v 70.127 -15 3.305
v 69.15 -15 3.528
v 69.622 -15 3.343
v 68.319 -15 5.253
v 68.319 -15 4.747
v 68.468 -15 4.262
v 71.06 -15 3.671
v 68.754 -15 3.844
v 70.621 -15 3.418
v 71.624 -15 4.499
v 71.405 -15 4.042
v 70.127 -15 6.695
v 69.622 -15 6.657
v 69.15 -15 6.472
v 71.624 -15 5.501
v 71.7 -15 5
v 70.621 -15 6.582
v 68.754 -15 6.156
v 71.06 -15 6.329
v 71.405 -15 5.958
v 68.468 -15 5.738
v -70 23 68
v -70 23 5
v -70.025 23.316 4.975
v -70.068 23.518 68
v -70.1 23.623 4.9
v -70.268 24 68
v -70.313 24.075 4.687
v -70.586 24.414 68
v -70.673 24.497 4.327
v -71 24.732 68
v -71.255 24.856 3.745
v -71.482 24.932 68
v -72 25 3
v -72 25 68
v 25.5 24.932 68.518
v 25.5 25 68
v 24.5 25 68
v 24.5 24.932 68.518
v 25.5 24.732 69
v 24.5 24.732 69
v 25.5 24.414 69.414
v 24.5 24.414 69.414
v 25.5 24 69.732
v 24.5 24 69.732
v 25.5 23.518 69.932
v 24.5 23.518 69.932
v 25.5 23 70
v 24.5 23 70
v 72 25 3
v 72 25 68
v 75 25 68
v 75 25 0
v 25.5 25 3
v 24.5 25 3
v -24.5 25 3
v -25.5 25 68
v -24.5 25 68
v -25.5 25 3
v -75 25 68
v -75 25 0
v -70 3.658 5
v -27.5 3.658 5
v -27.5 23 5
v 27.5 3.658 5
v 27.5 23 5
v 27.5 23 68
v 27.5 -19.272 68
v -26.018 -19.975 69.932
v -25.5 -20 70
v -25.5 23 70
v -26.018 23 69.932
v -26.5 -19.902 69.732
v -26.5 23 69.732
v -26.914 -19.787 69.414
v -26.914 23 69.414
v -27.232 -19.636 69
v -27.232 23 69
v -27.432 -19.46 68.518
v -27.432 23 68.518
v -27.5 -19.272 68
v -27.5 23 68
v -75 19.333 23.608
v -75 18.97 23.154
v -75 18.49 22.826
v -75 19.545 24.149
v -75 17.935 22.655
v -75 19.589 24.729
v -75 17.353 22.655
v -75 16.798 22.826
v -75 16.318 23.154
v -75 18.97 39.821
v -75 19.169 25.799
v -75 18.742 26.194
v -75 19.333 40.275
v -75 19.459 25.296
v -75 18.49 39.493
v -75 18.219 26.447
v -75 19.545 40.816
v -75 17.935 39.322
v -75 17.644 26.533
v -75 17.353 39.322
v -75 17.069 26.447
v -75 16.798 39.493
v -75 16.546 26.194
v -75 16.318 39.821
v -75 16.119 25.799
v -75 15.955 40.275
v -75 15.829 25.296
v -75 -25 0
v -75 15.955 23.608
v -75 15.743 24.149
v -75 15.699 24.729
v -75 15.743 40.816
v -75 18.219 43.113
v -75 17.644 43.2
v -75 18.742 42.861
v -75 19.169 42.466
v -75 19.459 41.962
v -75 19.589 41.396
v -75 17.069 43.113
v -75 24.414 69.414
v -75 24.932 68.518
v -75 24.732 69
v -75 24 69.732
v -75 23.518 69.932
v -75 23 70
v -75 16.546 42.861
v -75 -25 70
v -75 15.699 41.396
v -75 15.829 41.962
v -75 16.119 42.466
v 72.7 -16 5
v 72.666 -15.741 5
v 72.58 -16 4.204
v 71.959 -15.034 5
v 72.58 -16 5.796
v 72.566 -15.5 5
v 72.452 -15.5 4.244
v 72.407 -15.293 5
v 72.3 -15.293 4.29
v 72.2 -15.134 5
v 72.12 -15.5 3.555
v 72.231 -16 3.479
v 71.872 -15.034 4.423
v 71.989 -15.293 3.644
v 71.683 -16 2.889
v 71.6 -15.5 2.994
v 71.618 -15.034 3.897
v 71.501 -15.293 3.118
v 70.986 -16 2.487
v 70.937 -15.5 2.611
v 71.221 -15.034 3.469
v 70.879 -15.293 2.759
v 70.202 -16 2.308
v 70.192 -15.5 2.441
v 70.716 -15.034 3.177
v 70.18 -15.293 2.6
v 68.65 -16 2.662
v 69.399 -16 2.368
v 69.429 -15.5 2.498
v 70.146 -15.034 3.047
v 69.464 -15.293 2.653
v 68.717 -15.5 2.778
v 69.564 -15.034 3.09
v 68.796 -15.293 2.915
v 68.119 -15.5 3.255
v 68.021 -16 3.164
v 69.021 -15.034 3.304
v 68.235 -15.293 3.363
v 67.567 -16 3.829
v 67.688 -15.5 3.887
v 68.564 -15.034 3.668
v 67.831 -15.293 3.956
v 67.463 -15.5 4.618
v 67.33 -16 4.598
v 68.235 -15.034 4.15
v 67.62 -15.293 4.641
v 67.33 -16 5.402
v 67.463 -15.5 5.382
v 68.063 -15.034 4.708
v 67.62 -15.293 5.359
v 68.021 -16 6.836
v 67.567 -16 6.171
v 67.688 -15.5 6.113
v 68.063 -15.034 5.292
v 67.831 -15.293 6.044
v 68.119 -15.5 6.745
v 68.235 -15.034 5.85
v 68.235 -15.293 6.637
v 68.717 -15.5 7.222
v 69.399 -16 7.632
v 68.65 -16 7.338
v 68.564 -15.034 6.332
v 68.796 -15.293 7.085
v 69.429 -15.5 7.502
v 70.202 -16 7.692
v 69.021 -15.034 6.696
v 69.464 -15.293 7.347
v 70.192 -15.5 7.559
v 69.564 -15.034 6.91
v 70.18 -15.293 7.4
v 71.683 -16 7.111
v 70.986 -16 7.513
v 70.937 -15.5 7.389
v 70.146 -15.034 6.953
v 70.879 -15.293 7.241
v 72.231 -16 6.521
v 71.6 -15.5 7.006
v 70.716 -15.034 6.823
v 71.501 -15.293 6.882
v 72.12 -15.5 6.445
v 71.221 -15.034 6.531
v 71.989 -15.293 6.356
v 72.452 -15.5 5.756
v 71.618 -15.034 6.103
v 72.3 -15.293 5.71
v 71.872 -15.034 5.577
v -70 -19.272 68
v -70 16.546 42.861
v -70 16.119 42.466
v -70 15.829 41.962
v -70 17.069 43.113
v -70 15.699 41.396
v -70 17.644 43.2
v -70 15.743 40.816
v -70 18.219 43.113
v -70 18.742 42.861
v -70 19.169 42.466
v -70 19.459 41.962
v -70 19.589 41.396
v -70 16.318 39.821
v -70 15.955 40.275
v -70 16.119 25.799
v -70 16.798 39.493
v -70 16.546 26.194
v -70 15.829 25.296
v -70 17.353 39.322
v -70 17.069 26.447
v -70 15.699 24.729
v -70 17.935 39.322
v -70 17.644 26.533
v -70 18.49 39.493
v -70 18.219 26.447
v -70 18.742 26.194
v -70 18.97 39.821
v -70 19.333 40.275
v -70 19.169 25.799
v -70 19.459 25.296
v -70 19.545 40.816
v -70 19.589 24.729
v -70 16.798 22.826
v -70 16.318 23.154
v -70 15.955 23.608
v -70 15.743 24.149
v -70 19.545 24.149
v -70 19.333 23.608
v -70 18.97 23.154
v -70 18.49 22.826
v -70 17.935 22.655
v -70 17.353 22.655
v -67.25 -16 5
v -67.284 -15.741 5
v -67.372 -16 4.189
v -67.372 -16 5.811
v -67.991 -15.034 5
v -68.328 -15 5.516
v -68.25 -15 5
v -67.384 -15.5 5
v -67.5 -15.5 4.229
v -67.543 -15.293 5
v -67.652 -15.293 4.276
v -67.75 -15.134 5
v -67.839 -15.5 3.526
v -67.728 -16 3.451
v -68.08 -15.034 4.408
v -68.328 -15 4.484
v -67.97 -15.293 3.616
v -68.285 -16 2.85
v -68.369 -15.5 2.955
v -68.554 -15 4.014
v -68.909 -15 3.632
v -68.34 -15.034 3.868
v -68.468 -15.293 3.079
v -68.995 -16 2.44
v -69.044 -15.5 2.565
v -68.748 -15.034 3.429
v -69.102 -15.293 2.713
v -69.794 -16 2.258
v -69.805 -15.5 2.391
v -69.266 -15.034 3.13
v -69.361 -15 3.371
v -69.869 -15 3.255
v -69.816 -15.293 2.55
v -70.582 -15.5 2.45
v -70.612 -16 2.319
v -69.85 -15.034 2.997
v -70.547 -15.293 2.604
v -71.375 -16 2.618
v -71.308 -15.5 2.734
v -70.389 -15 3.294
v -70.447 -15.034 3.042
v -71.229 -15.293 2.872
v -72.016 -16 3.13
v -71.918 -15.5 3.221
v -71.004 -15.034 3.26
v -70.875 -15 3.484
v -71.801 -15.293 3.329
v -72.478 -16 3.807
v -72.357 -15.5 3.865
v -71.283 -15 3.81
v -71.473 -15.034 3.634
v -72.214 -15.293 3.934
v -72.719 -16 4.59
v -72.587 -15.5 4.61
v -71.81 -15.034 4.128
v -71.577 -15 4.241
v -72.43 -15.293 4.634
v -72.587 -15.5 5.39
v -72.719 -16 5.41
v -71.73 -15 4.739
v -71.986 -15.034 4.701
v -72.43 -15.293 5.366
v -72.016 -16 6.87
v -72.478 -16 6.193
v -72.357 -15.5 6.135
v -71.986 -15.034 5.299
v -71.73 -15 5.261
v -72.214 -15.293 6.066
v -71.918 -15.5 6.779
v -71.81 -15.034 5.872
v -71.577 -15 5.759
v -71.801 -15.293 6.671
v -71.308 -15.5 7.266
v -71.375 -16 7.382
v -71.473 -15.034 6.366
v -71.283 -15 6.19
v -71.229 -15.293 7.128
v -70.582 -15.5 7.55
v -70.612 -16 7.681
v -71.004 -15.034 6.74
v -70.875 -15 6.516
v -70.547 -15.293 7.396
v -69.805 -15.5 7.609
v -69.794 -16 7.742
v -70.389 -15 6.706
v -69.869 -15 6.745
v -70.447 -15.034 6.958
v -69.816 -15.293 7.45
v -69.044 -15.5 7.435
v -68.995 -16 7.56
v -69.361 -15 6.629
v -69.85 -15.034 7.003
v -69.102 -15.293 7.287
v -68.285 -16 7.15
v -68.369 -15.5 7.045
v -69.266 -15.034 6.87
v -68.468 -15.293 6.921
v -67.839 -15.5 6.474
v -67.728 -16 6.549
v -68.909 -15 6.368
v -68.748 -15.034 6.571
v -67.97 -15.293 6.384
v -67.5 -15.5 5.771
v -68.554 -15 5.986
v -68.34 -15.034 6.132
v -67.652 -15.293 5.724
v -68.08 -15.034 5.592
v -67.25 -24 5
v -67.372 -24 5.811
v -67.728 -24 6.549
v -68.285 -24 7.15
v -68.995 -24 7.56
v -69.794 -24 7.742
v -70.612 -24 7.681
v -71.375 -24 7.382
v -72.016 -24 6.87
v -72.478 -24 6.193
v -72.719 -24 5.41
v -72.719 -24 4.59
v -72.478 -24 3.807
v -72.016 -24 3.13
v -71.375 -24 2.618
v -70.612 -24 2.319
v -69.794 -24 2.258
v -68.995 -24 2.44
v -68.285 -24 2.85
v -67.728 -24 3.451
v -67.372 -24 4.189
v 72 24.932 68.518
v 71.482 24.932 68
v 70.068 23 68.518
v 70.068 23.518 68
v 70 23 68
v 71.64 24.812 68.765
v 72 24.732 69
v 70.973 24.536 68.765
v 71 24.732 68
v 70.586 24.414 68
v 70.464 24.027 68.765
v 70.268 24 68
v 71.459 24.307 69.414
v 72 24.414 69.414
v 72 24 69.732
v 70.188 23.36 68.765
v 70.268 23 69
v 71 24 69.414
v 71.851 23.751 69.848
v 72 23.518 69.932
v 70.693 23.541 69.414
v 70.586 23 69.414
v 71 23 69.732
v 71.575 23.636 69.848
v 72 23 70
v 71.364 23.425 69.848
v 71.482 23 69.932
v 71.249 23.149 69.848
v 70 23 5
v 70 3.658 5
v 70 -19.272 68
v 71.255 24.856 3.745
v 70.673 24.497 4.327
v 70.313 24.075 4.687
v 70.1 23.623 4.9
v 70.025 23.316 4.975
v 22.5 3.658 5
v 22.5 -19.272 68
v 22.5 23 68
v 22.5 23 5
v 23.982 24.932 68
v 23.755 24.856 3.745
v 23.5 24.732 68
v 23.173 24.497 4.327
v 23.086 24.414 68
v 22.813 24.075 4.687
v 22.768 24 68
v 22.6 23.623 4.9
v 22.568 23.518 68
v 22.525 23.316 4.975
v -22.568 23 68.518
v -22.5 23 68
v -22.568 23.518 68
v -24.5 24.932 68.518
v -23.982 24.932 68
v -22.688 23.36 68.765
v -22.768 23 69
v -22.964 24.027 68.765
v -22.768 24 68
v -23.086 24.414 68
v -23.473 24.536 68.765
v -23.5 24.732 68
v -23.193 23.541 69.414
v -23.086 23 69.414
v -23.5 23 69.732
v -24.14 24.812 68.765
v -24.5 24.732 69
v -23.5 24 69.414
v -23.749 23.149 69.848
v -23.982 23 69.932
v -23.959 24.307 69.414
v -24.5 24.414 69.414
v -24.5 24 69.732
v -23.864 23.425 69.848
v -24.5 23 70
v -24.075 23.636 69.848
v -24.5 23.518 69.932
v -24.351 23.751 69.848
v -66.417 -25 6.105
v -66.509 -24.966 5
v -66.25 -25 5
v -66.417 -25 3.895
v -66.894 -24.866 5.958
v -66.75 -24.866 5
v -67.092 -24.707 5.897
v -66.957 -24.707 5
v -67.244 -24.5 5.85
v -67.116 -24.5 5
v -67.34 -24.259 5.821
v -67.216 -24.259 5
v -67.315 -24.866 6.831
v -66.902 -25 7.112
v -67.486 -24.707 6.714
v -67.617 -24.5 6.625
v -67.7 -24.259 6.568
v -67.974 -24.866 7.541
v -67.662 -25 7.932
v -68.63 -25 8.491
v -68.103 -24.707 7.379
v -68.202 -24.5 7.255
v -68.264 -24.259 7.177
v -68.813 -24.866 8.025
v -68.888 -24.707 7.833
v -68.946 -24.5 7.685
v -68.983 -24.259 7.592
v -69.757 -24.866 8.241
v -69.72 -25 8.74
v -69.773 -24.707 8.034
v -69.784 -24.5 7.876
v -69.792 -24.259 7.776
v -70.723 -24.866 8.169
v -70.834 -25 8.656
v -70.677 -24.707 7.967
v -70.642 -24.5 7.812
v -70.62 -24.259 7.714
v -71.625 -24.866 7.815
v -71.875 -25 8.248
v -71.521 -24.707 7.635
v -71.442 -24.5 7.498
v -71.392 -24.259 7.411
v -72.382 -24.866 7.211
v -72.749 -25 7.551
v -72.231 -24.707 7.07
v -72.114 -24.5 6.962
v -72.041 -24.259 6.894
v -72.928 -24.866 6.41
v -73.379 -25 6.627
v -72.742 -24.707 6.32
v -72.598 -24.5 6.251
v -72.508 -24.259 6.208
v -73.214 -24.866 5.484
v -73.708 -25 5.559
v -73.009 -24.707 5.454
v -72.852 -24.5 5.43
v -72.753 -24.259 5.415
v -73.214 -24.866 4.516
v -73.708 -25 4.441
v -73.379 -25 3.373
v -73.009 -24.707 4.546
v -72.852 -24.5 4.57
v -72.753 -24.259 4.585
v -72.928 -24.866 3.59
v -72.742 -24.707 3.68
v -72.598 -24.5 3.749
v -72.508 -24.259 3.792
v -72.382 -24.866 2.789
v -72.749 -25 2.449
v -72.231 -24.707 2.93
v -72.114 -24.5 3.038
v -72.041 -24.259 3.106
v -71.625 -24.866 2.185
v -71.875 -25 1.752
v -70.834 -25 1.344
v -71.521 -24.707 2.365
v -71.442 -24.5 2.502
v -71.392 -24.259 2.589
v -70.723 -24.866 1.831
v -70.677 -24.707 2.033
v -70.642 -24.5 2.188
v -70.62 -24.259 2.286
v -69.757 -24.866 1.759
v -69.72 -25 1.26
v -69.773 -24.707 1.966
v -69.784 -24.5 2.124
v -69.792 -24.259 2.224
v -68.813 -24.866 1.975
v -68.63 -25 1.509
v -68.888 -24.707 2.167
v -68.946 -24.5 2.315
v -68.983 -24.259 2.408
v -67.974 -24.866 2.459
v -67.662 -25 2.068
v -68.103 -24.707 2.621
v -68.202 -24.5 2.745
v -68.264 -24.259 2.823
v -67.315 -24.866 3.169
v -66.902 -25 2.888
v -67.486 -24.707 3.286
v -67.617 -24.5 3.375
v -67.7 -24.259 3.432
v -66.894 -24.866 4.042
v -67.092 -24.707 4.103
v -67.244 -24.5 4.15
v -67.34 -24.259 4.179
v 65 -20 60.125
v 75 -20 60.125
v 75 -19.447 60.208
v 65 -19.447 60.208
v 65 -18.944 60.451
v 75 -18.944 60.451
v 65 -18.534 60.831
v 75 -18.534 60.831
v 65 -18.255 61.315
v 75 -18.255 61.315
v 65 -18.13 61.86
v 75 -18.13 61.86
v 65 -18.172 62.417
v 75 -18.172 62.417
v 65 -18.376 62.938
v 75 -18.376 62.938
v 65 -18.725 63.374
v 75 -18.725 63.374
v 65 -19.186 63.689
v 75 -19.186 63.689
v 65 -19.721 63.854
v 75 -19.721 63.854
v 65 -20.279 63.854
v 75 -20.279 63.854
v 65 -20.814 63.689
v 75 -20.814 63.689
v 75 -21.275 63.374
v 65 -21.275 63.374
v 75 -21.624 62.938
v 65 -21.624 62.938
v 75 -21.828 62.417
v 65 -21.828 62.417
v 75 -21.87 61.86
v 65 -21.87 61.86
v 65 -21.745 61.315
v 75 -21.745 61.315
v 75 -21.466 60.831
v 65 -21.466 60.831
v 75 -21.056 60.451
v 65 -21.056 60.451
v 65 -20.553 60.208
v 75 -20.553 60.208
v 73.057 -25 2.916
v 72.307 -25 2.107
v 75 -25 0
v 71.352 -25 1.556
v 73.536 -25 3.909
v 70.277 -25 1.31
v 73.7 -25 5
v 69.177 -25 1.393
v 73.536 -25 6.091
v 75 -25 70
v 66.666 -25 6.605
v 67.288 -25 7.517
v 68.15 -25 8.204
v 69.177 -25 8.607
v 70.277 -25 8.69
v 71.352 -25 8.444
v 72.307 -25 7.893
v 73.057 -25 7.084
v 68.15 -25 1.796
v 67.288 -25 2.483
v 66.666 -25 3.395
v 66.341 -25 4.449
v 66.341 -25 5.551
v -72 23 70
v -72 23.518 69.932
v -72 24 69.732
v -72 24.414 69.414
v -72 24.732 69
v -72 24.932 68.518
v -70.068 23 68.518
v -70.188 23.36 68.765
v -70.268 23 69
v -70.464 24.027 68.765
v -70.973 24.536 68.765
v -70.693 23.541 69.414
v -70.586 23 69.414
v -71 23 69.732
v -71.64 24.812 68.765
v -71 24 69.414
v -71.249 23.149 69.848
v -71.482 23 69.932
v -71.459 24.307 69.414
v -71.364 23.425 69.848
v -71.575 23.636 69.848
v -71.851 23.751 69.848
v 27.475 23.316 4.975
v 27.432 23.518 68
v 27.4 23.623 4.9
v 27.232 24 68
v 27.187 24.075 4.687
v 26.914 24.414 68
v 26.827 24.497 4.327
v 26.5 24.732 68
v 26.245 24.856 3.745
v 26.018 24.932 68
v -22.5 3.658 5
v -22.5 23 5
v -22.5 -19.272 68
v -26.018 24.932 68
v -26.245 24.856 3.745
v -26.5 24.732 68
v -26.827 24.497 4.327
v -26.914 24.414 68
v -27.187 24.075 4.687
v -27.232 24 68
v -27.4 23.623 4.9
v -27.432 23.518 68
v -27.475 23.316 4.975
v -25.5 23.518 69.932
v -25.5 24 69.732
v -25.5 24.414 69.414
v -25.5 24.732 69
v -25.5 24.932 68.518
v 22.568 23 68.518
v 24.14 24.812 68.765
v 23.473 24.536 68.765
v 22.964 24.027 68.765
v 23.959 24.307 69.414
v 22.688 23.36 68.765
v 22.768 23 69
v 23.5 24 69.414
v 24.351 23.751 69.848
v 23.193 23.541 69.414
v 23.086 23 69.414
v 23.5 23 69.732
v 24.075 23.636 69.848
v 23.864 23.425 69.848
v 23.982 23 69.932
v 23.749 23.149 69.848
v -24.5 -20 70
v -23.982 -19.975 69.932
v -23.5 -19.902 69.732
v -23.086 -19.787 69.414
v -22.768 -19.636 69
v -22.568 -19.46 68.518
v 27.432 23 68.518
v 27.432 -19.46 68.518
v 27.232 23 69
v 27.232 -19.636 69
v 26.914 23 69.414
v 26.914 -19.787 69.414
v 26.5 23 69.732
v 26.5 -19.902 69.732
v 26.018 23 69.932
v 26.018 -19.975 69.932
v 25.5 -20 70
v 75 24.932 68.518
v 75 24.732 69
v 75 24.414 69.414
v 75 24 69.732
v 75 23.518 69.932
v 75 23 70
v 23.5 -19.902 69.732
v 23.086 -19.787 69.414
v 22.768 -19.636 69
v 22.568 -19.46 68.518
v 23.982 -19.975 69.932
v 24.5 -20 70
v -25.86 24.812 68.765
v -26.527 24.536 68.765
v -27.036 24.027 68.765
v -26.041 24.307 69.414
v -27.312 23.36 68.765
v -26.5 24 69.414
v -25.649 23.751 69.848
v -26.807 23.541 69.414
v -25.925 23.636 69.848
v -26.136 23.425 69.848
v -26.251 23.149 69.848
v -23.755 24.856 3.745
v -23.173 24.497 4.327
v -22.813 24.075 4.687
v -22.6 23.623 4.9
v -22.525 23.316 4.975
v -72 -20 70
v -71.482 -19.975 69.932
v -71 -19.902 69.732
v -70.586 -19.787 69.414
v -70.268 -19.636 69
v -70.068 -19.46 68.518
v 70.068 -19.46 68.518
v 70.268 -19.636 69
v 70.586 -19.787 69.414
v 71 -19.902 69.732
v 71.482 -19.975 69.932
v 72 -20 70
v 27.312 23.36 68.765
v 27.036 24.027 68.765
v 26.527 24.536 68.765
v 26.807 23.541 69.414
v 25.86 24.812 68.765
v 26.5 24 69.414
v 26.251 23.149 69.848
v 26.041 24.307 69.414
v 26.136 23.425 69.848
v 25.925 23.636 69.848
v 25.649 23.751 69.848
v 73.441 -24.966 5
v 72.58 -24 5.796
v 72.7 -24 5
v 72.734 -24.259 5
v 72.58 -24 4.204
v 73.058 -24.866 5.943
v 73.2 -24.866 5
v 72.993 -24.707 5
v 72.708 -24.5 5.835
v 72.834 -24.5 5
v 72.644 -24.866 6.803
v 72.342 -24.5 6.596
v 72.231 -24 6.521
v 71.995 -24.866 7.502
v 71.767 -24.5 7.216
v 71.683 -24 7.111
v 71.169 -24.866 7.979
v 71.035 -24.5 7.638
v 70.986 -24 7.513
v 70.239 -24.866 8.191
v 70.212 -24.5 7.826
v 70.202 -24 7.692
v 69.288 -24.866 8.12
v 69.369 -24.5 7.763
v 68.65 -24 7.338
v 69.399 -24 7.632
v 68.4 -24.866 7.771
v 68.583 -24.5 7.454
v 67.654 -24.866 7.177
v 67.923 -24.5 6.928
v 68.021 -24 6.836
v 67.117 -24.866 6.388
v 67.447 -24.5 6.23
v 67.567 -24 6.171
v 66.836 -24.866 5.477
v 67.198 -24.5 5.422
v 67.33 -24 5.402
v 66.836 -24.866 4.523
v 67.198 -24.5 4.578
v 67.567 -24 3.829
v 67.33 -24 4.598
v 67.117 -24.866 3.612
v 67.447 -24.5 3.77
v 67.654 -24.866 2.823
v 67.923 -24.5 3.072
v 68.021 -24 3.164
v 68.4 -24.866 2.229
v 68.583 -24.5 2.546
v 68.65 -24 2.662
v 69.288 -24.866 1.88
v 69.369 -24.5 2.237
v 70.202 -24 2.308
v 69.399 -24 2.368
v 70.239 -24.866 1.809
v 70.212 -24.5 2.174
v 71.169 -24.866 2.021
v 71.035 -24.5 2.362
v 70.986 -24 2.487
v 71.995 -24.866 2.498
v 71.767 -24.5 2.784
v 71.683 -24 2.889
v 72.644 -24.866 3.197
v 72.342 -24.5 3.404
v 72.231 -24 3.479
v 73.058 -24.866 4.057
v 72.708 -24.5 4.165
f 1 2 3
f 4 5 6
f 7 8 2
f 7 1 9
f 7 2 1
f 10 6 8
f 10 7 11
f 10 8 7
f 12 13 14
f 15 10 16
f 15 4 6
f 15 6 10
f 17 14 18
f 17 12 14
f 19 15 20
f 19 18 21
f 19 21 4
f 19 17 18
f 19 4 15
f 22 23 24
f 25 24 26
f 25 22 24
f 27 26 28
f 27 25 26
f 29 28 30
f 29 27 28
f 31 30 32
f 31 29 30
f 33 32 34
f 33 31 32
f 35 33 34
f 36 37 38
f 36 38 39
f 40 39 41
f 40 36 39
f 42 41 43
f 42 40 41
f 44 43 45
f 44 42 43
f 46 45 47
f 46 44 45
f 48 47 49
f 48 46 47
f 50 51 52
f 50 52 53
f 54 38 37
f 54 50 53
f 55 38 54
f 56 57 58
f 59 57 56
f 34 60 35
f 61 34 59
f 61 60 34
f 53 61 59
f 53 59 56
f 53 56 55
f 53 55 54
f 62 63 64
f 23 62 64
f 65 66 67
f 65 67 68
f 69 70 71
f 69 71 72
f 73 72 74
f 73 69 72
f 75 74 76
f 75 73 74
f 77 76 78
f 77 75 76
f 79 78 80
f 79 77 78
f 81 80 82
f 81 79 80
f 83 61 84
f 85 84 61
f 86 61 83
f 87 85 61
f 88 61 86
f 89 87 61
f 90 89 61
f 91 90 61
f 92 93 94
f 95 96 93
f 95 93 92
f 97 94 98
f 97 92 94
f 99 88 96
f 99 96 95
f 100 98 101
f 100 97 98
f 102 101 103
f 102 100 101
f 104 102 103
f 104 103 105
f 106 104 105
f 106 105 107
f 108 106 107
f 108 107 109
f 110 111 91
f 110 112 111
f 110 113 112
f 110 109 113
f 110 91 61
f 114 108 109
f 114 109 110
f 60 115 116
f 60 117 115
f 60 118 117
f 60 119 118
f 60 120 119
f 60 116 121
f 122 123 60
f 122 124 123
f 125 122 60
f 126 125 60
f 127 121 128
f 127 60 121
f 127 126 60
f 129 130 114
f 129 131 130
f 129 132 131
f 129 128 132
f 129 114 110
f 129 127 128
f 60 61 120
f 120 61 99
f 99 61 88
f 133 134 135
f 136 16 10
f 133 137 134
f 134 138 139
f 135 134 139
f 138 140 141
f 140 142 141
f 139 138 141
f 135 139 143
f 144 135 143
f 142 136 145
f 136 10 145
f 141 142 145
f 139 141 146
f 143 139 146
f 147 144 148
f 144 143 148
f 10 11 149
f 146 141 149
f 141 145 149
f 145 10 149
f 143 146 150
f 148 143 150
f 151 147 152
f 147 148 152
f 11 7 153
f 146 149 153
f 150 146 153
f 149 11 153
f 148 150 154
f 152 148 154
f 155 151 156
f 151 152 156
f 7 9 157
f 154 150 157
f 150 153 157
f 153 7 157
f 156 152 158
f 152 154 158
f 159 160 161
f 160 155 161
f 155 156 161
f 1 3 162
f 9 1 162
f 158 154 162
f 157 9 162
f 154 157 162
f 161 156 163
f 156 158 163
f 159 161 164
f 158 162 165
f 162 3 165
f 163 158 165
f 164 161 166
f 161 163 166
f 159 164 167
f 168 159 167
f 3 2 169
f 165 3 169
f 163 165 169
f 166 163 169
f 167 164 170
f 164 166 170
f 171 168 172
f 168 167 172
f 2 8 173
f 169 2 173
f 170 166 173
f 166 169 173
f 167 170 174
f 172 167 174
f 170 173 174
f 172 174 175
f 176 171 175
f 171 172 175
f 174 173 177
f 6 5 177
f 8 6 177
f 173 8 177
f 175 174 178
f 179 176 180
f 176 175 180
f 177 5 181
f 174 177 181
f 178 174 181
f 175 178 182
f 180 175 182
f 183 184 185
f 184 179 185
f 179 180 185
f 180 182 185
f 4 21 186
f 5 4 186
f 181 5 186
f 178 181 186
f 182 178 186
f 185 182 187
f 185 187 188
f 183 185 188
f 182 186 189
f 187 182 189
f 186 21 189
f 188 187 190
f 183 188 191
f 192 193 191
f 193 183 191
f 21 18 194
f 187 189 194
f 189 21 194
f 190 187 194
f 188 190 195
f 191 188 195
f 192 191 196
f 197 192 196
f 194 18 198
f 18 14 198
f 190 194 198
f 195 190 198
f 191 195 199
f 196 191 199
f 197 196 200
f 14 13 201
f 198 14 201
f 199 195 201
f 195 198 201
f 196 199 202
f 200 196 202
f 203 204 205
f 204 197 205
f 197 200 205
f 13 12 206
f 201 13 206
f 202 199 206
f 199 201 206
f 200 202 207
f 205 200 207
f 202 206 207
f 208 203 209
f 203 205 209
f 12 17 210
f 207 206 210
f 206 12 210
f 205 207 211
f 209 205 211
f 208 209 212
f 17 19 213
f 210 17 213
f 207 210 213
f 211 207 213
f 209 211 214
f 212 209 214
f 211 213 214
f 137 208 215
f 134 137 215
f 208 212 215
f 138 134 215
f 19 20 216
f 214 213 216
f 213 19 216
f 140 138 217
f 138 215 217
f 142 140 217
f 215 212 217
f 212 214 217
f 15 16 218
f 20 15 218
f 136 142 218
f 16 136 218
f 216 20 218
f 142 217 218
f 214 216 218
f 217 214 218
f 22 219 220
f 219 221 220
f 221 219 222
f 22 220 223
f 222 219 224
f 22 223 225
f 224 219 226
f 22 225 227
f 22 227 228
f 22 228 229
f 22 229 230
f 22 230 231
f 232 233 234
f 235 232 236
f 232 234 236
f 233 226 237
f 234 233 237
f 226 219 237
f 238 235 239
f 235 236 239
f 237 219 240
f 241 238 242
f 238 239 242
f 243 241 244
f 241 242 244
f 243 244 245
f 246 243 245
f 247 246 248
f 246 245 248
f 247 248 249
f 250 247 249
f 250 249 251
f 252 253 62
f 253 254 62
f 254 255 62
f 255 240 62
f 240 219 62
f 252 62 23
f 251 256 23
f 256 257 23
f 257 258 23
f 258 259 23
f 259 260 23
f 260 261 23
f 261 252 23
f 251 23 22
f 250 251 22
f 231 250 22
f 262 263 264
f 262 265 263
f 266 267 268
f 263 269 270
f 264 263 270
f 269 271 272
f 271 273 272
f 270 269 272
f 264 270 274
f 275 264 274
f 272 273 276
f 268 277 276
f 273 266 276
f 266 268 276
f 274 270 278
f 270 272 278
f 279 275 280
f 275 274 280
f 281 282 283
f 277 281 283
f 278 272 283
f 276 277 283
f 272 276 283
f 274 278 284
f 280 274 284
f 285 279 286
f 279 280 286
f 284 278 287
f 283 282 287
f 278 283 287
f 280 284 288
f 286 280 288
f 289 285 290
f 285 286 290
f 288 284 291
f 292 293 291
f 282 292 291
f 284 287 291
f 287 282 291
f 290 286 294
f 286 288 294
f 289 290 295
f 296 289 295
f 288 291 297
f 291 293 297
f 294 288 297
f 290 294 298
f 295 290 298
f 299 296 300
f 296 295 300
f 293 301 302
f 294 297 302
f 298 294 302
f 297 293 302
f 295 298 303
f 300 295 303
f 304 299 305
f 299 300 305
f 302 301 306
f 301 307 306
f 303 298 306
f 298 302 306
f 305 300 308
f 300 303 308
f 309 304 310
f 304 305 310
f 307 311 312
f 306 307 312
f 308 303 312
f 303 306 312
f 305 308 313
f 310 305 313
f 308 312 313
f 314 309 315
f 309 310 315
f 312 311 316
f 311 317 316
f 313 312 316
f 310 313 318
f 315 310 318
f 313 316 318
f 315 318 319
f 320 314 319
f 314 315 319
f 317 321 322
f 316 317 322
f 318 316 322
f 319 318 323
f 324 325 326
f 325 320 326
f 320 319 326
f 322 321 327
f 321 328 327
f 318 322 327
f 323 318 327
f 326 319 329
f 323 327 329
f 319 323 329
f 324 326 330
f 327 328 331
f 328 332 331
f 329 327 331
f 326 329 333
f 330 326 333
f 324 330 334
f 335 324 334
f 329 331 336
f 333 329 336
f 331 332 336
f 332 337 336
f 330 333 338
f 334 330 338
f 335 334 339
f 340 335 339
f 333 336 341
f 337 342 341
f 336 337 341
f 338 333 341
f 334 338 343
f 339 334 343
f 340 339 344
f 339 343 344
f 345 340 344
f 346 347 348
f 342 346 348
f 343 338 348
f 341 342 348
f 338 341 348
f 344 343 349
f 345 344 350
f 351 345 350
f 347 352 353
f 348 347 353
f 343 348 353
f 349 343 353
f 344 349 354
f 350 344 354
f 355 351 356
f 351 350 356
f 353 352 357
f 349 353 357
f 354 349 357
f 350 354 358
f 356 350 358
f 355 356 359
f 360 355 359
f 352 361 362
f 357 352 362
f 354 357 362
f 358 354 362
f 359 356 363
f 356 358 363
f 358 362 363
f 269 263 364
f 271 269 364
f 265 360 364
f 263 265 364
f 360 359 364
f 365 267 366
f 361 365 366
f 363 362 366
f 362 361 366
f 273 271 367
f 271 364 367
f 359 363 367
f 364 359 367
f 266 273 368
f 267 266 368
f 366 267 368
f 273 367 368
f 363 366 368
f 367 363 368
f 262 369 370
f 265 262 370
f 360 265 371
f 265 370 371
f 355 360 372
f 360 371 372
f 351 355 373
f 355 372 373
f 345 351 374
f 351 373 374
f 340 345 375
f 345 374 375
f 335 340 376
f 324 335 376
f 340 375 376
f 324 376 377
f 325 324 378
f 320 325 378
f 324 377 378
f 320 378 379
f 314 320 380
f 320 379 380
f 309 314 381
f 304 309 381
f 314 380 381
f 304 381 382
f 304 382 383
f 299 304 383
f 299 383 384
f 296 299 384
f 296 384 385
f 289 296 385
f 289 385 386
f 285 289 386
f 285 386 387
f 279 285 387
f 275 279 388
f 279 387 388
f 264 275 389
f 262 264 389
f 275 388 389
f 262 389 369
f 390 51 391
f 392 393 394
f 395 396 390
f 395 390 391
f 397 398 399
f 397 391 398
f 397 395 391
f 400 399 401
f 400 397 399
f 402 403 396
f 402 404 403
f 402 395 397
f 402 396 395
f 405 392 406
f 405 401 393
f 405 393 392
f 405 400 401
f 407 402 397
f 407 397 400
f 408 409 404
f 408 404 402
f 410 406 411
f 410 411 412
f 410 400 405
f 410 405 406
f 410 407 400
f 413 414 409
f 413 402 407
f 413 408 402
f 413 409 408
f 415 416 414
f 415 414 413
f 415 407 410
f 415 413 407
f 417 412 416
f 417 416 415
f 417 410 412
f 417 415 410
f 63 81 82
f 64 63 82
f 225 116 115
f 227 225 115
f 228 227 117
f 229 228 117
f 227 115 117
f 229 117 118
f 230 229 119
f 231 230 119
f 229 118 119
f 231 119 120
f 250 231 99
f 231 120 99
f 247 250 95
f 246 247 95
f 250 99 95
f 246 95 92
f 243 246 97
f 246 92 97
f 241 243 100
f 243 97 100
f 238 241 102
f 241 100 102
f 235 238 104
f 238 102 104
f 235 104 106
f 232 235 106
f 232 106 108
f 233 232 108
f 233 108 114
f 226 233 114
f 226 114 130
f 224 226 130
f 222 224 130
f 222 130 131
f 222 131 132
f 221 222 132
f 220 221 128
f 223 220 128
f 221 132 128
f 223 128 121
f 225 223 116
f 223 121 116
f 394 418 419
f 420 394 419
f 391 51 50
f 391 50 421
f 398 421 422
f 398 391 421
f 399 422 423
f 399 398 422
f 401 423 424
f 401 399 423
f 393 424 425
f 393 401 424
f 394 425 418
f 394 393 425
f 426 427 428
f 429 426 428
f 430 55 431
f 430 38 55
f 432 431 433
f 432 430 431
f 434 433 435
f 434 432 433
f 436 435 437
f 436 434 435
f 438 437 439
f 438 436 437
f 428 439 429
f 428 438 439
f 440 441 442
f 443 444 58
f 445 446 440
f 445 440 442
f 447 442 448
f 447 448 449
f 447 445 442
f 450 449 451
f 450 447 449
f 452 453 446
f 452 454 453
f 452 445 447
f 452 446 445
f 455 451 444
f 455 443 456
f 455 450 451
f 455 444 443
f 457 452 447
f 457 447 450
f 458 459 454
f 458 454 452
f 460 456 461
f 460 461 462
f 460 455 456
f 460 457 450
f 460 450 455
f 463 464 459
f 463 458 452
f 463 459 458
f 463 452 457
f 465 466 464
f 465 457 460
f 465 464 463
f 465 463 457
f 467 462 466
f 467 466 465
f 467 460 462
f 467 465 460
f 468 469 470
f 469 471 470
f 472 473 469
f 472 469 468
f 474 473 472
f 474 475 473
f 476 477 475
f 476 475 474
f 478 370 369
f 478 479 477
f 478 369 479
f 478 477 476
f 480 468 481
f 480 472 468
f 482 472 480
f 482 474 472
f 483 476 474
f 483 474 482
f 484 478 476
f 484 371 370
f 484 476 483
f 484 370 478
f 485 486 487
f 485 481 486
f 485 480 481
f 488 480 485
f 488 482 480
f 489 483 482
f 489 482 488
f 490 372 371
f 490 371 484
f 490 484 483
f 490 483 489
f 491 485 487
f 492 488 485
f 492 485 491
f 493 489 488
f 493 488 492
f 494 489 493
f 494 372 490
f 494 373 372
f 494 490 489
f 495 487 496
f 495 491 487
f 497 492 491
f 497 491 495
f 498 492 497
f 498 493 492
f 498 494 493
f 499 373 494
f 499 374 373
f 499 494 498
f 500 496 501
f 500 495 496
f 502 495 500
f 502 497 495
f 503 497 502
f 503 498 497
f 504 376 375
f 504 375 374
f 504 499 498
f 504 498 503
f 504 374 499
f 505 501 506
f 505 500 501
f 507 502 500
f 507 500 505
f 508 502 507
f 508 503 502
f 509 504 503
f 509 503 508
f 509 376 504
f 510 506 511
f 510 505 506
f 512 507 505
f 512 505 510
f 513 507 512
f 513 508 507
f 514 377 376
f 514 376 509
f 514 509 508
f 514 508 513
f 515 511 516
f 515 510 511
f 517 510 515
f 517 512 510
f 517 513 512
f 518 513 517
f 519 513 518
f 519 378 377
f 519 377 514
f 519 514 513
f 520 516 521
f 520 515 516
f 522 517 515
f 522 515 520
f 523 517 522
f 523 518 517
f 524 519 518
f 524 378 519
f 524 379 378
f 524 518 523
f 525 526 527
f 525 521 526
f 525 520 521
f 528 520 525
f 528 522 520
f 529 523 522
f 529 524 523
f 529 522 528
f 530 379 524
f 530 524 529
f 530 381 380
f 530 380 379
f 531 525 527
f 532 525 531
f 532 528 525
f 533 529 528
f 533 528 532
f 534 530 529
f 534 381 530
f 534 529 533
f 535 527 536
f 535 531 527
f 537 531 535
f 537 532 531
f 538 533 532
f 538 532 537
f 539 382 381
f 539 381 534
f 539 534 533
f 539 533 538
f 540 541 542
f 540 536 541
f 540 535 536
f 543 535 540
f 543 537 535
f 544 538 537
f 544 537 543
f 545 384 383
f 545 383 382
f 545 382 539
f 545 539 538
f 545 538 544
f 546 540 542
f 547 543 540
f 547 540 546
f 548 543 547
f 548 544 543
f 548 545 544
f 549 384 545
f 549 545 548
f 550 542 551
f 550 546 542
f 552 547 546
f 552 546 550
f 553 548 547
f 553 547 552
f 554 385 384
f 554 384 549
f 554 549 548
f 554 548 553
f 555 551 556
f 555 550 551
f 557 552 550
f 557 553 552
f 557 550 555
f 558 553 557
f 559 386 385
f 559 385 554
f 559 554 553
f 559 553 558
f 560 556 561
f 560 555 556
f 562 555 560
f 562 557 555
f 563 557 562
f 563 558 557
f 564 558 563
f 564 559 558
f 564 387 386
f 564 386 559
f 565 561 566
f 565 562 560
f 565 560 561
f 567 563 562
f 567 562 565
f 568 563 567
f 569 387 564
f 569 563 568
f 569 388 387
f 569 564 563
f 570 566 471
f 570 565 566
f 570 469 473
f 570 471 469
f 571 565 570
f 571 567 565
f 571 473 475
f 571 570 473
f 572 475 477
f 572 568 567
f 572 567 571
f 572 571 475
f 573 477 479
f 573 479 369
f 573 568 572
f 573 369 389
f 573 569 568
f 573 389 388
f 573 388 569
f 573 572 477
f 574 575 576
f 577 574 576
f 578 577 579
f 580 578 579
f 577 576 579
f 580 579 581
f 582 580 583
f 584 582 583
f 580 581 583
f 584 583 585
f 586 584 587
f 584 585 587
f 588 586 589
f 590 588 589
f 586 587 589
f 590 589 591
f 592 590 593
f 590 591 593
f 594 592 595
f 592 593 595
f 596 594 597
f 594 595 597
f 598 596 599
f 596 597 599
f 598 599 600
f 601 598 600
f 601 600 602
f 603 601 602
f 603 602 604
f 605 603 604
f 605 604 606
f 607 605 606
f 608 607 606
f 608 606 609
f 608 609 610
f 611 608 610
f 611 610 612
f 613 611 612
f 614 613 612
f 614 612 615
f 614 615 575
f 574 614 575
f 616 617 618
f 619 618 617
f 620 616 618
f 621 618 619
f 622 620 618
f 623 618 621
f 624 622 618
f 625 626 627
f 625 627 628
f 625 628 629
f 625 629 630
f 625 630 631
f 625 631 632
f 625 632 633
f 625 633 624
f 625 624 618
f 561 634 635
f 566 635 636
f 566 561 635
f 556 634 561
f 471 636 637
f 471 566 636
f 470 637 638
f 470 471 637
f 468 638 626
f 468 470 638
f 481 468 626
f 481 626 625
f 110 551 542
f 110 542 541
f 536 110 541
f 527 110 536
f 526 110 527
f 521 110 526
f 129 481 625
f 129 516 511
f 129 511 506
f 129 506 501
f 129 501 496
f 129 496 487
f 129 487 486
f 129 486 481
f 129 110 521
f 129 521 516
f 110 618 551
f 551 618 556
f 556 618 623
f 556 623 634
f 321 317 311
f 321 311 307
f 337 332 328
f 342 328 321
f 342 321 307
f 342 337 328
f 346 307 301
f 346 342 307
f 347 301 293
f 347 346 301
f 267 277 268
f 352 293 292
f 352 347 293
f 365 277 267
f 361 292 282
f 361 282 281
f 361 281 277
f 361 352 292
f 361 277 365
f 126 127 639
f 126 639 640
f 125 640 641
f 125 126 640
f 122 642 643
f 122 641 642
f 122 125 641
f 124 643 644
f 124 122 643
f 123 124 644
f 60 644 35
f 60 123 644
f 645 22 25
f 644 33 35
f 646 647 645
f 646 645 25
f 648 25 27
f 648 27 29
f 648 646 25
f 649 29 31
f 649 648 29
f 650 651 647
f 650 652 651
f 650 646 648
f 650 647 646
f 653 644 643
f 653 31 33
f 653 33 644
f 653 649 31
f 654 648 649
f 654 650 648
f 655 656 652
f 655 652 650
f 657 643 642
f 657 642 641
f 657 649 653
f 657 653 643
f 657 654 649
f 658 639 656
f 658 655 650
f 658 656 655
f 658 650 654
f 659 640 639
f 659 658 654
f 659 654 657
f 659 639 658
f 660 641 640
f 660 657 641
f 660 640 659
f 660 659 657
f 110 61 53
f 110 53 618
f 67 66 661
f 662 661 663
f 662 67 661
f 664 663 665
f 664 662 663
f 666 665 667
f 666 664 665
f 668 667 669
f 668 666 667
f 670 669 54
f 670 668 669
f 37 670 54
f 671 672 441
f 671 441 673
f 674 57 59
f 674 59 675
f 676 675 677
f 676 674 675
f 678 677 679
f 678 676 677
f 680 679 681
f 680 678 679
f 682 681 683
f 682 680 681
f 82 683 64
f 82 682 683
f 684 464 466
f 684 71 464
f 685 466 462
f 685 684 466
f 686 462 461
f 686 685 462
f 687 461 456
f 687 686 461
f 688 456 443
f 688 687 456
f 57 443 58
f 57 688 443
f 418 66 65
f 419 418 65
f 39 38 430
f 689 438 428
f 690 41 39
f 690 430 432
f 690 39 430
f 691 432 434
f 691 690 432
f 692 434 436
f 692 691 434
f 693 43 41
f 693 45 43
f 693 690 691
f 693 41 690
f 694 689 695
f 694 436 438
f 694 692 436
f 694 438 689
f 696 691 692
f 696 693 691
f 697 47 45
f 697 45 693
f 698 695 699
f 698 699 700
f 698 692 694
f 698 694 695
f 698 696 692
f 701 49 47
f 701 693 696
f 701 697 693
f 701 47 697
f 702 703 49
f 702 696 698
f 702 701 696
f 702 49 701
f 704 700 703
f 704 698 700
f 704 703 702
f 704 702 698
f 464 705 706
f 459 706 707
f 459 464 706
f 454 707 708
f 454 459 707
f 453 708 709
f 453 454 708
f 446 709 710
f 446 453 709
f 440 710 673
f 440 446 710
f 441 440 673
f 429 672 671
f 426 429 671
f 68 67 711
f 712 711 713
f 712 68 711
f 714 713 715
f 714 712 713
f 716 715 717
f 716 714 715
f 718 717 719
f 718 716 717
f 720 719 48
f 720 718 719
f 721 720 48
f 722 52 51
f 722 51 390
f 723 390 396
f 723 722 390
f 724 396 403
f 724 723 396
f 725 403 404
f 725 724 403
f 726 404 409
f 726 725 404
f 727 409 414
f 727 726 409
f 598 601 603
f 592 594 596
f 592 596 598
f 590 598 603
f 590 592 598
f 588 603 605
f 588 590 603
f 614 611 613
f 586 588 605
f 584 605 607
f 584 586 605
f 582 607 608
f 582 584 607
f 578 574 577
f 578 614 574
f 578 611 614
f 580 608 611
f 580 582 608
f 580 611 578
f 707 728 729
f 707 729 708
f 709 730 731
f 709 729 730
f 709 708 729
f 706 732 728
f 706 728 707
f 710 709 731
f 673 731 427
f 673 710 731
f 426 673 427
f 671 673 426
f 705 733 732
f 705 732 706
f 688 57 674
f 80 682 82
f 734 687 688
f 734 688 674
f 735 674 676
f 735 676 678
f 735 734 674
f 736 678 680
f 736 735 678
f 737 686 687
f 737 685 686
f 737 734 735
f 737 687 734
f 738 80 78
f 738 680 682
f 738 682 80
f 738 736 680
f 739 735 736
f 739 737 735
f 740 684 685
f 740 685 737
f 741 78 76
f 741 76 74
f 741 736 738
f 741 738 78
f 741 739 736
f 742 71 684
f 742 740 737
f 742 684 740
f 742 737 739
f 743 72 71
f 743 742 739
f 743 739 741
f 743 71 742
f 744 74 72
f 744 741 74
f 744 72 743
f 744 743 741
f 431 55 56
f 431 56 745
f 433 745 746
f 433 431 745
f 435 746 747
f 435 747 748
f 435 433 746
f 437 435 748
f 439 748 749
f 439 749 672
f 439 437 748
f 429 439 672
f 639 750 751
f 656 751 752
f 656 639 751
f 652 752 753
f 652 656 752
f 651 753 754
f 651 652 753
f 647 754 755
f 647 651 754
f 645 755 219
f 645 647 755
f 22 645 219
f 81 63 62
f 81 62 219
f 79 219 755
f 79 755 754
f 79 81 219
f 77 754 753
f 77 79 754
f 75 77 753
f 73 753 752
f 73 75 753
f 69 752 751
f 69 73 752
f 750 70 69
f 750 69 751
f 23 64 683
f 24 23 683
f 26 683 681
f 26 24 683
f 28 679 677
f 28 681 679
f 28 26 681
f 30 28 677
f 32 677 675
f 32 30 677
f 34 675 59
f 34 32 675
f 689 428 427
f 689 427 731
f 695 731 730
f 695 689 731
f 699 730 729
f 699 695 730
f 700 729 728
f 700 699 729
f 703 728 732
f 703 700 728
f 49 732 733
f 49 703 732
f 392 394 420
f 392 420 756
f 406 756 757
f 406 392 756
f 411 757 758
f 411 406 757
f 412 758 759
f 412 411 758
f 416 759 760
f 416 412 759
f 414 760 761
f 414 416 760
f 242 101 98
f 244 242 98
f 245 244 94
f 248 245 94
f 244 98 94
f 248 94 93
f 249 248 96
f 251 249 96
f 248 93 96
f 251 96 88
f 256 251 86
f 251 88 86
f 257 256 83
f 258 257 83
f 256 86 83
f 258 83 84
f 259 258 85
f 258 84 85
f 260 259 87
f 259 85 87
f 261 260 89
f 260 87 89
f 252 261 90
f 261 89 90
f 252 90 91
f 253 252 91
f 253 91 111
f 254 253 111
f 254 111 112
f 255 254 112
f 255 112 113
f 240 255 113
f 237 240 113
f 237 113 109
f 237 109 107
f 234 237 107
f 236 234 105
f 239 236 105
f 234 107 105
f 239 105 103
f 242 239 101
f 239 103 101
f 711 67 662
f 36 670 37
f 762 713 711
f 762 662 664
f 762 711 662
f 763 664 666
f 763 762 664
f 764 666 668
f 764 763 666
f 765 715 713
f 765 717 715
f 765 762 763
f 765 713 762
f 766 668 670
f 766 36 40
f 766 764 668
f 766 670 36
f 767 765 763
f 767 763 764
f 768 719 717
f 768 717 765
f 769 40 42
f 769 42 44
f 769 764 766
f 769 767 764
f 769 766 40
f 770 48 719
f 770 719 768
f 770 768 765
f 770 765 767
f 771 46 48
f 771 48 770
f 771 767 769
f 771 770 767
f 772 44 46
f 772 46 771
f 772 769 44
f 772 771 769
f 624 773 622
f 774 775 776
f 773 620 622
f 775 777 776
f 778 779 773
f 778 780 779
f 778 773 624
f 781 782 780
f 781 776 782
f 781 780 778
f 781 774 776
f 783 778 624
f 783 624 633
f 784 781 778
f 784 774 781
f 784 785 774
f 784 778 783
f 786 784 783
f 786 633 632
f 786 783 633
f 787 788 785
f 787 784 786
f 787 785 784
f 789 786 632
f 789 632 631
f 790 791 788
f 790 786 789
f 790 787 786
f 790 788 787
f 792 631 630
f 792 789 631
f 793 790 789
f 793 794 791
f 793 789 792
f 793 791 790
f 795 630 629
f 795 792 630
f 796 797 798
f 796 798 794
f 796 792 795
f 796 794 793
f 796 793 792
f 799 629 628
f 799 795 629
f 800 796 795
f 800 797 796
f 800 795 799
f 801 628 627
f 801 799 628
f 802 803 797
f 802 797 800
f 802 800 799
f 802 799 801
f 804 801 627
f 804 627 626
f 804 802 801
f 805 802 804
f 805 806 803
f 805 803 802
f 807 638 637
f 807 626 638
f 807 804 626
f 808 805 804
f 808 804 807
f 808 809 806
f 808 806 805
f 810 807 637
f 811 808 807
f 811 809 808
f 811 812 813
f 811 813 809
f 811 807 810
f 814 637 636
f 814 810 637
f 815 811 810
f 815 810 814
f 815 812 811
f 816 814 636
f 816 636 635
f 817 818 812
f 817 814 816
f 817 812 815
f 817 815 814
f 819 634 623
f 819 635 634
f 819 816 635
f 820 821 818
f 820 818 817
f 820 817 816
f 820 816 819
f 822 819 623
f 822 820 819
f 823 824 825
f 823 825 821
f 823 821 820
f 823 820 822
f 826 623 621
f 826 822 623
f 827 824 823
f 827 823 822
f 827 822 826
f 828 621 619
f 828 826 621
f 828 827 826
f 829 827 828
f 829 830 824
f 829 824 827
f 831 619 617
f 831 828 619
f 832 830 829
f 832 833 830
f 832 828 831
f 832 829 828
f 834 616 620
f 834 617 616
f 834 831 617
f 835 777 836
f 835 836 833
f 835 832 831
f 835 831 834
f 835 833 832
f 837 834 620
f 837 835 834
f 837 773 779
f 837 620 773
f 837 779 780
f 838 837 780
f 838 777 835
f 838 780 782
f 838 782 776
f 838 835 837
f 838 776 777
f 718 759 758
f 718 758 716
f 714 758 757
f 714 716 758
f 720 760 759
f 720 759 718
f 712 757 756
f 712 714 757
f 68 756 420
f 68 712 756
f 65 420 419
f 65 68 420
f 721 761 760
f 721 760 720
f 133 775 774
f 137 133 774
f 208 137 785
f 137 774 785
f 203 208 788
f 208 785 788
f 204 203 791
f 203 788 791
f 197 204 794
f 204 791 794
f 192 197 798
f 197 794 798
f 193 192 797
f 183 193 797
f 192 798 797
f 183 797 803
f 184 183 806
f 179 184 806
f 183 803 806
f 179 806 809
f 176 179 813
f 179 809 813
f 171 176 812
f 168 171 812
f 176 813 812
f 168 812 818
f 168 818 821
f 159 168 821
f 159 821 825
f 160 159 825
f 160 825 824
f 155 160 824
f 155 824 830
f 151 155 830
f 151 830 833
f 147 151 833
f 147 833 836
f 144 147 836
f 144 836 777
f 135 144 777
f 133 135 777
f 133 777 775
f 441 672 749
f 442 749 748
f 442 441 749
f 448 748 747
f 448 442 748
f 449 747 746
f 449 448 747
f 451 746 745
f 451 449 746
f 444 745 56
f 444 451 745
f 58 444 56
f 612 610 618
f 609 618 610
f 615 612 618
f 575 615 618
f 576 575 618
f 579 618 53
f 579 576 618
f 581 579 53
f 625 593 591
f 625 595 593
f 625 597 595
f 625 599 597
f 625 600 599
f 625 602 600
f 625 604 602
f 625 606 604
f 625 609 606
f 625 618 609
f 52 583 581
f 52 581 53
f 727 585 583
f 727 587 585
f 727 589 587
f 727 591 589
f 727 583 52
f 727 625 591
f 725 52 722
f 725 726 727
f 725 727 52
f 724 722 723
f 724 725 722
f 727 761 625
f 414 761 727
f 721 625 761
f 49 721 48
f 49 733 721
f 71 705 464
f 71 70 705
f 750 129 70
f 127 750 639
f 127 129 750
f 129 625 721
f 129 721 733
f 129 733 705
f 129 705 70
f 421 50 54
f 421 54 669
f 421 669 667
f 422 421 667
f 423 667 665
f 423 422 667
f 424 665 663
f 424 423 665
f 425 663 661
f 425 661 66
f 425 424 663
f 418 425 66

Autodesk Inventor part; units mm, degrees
ref_plane "YZ Plane" through (0, 0, 0) normal (1, 0, 0) x (0, 1, 0)
ref_plane "XZ Plane" through (0, 0, 0) normal (0, 1, 0) x (-1, 0, 0)
ref_plane "XY Plane" through (0, 0, 0) normal (0, 0, 1) x (1, 0, 0)
sketch "Sketch1" plane through (0, 0, 0) normal (0, 0, 1) x (1, 0, 0)
  line L0 (-75, 25) -> (75, 25)
  line L1 (75, 25) -> (75, -25)
  line L2 (75, -25) -> (-75, -25)
  line L3 (-75, -25) -> (-75, 25)
  line L4 (-75, 25) -> (75, -25) construction
  line L5 (75, 25) -> (-75, -25) construction
  line L6 (25, 25) -> (25, -25)
  line L7 (22.5, 25) -> (27.5, 25)
  line L8 (27.5, 25) -> (27.5, -25)
  line L9 (27.5, -25) -> (22.5, -25)
  line L10 (22.5, -25) -> (22.5, 25)
  line L11 (22.5, 25) -> (27.5, -25) construction
  line L12 (27.5, 25) -> (22.5, -25) construction
  line L13 (75, 25) -> (70, 25)
  line L14 (70, 25) -> (70, -25)
  line L15 (70, -25) -> (75, -25)
  line L16 (75, -25) -> (75, 25)
  point P0 (0, 0)
  point P1 (25, 0)
  point P2 (22.5, 25)
  point P3 (22.5, -25)
  point P4 (27.5, -25)
  point P5 (27.5, 25)
  dimension "d0" = 50
  dimension "d1" = 150
  dimension "d9" = 50
  dimension "d14" = 5
  dimension "d15" = 5
sketch "Sketch2" plane through (0, 0, 0) normal (1, 0, 0) x (0, 1, 0)
  line L0 (25, 0) -> (-25, 0) projected
  line L1 (25, 0) -> (-25, 0)
  line L2 (-25, 0) -> (-25, 70)
  line L3 (-25, 70) -> (25, 70)
  line L4 (25, 70) -> (25, 0)
  line L5 (-20, 70) -> (5.4779, 0)
  line L6 (25, 5) -> (-25, 5)
  line L7 (-20, 70) -> (-20, 0)
  point P0 (0, 0)
  point P1 (5.4779, 0)
  point P2 (3.6581, 5)
  dimension "d2" = 70
  dimension "d3" = 5
  dimension "d5" = 5
  dimension "d20" = 20
extrude "Extrusion1" add sketch "Sketch2" along normal blind 75 contours L0 L7 L6 L5 | L0 L2 L6 L7 | L6 L7 L5 | L6 L2 L3 L7
extrude "Extrusion2" add sketch "Sketch2" along normal blind 75 contours L0 L5 L6 L4
extrude "Extrusion3" add sketch "Sketch1" along normal blind 70 contours L0 L1 L2 L14
extrude "Extrusion4" add sketch "Sketch1" along normal blind 70 contours L0 L6 L2 L10 | L0 L8 L2 L6
mirror "Mirror1" about plane through (0, 0, 0) normal (1, 0, 0)
fillet "Fillet1" radius 2 9 edges at (-27.5, 25, 37.5) (-22.5, 25, 37.5) (22.5, 25, 37.5) (27.5, 25, 37.5) (70, 25, 37.5) (-70, 25, 37.5) (-48.75, 25, 5) (0, 25, 5) (48.75, 25, 5)
fillet "Fillet2" radius 2 10 edges at (-25, 25, 70) (-22.5, 1.5, 70) (-27.5, 1.5, 70) (25, 25, 70) (27.5, 1.5, 70) (22.5, 1.5, 70) (73.5, 25, 70) (70, 1.5, 70) (-73.5, 25, 70) (-70, 1.5, 70)
sketch "Sketch3" plane through (75, -25, 0) normal (0, -1, 0) x (1, 0, 0)
  line L0 (0, 0) -> (-150, 0) projected
  line L1 (0, 70) -> (0, 0) projected
  line L2 (-150, 70) -> (0, 70) projected
  line L3 (-150, 70) -> (-150, 0) projected
  line L4 (-145, 5) -> (-5, 5)
  line L5 (-5, 5) -> (-5, 65)
  line L6 (-5, 65) -> (-145, 65)
  line L7 (-145, 65) -> (-145, 5)
  circle A0 centre (-5, 5) radius 2.7
  circle A1 centre (-145, 5) radius 2.75
  point P0 (-75, 0)
  dimension "d35" = 5
  dimension "d36" = 5.4
  dimension "d37" = 5.5
extrude "Extrusion5" cut sketch "Sketch3" against normal blind 10 contours L7 A1 L4 | L4 A1 L7 | A0 L5 L4 | L4 L5 A0
fillet "Fillet3" radius 1 2 edges at (67.3, -25, 5) (-72.75, -25, 5)
ref_plane "Work Plane2" through (75, -25, 5) normal (0, 0, -1) x (-1, 0, 0)
fillet "Fillet4" radius 1 1 edges at (-72.75, -15, 5)
fillet "Fillet5" radius 1 1 edges at (67.3, -15, 5)
sketch "Sketch4" plane through (75, 0, 0) normal (1, 0, 0) x (0, 0, -1)
  circle A0 centre (-62, -20) radius 1.875
  point P0 (0, 0)
  dimension "d44" = 3.75
extrude "Extrusion6" cut sketch "Sketch4" against normal blind 10
sketch "Sketch6" plane through (-75, -25, 0) normal (-1, 0, 0) x (0, 0, 1)
  circle A0 centre (41.25, 42.644) radius 1.95
  circle A1 centre (24.5833, 42.644) radius 1.95
  point P0 (0, 25)
  dimension "d52" = 3.9
  dimension "d53" = 3.9
extrude "Extrusion7" cut sketch "Sketch6" against normal blind 5
equation "\"d9\" = 0.333333 * d1"
equation "\"d5\" = d3"
equation "\"d10\" = 0.5 * d1"
equation "\"d12\" = 0.5 * d1"
equation "\"d16\" = d2"
equation "\"d18\" = d2"
properties part number "rubbish-container-group2" material "ABS Plastic"
